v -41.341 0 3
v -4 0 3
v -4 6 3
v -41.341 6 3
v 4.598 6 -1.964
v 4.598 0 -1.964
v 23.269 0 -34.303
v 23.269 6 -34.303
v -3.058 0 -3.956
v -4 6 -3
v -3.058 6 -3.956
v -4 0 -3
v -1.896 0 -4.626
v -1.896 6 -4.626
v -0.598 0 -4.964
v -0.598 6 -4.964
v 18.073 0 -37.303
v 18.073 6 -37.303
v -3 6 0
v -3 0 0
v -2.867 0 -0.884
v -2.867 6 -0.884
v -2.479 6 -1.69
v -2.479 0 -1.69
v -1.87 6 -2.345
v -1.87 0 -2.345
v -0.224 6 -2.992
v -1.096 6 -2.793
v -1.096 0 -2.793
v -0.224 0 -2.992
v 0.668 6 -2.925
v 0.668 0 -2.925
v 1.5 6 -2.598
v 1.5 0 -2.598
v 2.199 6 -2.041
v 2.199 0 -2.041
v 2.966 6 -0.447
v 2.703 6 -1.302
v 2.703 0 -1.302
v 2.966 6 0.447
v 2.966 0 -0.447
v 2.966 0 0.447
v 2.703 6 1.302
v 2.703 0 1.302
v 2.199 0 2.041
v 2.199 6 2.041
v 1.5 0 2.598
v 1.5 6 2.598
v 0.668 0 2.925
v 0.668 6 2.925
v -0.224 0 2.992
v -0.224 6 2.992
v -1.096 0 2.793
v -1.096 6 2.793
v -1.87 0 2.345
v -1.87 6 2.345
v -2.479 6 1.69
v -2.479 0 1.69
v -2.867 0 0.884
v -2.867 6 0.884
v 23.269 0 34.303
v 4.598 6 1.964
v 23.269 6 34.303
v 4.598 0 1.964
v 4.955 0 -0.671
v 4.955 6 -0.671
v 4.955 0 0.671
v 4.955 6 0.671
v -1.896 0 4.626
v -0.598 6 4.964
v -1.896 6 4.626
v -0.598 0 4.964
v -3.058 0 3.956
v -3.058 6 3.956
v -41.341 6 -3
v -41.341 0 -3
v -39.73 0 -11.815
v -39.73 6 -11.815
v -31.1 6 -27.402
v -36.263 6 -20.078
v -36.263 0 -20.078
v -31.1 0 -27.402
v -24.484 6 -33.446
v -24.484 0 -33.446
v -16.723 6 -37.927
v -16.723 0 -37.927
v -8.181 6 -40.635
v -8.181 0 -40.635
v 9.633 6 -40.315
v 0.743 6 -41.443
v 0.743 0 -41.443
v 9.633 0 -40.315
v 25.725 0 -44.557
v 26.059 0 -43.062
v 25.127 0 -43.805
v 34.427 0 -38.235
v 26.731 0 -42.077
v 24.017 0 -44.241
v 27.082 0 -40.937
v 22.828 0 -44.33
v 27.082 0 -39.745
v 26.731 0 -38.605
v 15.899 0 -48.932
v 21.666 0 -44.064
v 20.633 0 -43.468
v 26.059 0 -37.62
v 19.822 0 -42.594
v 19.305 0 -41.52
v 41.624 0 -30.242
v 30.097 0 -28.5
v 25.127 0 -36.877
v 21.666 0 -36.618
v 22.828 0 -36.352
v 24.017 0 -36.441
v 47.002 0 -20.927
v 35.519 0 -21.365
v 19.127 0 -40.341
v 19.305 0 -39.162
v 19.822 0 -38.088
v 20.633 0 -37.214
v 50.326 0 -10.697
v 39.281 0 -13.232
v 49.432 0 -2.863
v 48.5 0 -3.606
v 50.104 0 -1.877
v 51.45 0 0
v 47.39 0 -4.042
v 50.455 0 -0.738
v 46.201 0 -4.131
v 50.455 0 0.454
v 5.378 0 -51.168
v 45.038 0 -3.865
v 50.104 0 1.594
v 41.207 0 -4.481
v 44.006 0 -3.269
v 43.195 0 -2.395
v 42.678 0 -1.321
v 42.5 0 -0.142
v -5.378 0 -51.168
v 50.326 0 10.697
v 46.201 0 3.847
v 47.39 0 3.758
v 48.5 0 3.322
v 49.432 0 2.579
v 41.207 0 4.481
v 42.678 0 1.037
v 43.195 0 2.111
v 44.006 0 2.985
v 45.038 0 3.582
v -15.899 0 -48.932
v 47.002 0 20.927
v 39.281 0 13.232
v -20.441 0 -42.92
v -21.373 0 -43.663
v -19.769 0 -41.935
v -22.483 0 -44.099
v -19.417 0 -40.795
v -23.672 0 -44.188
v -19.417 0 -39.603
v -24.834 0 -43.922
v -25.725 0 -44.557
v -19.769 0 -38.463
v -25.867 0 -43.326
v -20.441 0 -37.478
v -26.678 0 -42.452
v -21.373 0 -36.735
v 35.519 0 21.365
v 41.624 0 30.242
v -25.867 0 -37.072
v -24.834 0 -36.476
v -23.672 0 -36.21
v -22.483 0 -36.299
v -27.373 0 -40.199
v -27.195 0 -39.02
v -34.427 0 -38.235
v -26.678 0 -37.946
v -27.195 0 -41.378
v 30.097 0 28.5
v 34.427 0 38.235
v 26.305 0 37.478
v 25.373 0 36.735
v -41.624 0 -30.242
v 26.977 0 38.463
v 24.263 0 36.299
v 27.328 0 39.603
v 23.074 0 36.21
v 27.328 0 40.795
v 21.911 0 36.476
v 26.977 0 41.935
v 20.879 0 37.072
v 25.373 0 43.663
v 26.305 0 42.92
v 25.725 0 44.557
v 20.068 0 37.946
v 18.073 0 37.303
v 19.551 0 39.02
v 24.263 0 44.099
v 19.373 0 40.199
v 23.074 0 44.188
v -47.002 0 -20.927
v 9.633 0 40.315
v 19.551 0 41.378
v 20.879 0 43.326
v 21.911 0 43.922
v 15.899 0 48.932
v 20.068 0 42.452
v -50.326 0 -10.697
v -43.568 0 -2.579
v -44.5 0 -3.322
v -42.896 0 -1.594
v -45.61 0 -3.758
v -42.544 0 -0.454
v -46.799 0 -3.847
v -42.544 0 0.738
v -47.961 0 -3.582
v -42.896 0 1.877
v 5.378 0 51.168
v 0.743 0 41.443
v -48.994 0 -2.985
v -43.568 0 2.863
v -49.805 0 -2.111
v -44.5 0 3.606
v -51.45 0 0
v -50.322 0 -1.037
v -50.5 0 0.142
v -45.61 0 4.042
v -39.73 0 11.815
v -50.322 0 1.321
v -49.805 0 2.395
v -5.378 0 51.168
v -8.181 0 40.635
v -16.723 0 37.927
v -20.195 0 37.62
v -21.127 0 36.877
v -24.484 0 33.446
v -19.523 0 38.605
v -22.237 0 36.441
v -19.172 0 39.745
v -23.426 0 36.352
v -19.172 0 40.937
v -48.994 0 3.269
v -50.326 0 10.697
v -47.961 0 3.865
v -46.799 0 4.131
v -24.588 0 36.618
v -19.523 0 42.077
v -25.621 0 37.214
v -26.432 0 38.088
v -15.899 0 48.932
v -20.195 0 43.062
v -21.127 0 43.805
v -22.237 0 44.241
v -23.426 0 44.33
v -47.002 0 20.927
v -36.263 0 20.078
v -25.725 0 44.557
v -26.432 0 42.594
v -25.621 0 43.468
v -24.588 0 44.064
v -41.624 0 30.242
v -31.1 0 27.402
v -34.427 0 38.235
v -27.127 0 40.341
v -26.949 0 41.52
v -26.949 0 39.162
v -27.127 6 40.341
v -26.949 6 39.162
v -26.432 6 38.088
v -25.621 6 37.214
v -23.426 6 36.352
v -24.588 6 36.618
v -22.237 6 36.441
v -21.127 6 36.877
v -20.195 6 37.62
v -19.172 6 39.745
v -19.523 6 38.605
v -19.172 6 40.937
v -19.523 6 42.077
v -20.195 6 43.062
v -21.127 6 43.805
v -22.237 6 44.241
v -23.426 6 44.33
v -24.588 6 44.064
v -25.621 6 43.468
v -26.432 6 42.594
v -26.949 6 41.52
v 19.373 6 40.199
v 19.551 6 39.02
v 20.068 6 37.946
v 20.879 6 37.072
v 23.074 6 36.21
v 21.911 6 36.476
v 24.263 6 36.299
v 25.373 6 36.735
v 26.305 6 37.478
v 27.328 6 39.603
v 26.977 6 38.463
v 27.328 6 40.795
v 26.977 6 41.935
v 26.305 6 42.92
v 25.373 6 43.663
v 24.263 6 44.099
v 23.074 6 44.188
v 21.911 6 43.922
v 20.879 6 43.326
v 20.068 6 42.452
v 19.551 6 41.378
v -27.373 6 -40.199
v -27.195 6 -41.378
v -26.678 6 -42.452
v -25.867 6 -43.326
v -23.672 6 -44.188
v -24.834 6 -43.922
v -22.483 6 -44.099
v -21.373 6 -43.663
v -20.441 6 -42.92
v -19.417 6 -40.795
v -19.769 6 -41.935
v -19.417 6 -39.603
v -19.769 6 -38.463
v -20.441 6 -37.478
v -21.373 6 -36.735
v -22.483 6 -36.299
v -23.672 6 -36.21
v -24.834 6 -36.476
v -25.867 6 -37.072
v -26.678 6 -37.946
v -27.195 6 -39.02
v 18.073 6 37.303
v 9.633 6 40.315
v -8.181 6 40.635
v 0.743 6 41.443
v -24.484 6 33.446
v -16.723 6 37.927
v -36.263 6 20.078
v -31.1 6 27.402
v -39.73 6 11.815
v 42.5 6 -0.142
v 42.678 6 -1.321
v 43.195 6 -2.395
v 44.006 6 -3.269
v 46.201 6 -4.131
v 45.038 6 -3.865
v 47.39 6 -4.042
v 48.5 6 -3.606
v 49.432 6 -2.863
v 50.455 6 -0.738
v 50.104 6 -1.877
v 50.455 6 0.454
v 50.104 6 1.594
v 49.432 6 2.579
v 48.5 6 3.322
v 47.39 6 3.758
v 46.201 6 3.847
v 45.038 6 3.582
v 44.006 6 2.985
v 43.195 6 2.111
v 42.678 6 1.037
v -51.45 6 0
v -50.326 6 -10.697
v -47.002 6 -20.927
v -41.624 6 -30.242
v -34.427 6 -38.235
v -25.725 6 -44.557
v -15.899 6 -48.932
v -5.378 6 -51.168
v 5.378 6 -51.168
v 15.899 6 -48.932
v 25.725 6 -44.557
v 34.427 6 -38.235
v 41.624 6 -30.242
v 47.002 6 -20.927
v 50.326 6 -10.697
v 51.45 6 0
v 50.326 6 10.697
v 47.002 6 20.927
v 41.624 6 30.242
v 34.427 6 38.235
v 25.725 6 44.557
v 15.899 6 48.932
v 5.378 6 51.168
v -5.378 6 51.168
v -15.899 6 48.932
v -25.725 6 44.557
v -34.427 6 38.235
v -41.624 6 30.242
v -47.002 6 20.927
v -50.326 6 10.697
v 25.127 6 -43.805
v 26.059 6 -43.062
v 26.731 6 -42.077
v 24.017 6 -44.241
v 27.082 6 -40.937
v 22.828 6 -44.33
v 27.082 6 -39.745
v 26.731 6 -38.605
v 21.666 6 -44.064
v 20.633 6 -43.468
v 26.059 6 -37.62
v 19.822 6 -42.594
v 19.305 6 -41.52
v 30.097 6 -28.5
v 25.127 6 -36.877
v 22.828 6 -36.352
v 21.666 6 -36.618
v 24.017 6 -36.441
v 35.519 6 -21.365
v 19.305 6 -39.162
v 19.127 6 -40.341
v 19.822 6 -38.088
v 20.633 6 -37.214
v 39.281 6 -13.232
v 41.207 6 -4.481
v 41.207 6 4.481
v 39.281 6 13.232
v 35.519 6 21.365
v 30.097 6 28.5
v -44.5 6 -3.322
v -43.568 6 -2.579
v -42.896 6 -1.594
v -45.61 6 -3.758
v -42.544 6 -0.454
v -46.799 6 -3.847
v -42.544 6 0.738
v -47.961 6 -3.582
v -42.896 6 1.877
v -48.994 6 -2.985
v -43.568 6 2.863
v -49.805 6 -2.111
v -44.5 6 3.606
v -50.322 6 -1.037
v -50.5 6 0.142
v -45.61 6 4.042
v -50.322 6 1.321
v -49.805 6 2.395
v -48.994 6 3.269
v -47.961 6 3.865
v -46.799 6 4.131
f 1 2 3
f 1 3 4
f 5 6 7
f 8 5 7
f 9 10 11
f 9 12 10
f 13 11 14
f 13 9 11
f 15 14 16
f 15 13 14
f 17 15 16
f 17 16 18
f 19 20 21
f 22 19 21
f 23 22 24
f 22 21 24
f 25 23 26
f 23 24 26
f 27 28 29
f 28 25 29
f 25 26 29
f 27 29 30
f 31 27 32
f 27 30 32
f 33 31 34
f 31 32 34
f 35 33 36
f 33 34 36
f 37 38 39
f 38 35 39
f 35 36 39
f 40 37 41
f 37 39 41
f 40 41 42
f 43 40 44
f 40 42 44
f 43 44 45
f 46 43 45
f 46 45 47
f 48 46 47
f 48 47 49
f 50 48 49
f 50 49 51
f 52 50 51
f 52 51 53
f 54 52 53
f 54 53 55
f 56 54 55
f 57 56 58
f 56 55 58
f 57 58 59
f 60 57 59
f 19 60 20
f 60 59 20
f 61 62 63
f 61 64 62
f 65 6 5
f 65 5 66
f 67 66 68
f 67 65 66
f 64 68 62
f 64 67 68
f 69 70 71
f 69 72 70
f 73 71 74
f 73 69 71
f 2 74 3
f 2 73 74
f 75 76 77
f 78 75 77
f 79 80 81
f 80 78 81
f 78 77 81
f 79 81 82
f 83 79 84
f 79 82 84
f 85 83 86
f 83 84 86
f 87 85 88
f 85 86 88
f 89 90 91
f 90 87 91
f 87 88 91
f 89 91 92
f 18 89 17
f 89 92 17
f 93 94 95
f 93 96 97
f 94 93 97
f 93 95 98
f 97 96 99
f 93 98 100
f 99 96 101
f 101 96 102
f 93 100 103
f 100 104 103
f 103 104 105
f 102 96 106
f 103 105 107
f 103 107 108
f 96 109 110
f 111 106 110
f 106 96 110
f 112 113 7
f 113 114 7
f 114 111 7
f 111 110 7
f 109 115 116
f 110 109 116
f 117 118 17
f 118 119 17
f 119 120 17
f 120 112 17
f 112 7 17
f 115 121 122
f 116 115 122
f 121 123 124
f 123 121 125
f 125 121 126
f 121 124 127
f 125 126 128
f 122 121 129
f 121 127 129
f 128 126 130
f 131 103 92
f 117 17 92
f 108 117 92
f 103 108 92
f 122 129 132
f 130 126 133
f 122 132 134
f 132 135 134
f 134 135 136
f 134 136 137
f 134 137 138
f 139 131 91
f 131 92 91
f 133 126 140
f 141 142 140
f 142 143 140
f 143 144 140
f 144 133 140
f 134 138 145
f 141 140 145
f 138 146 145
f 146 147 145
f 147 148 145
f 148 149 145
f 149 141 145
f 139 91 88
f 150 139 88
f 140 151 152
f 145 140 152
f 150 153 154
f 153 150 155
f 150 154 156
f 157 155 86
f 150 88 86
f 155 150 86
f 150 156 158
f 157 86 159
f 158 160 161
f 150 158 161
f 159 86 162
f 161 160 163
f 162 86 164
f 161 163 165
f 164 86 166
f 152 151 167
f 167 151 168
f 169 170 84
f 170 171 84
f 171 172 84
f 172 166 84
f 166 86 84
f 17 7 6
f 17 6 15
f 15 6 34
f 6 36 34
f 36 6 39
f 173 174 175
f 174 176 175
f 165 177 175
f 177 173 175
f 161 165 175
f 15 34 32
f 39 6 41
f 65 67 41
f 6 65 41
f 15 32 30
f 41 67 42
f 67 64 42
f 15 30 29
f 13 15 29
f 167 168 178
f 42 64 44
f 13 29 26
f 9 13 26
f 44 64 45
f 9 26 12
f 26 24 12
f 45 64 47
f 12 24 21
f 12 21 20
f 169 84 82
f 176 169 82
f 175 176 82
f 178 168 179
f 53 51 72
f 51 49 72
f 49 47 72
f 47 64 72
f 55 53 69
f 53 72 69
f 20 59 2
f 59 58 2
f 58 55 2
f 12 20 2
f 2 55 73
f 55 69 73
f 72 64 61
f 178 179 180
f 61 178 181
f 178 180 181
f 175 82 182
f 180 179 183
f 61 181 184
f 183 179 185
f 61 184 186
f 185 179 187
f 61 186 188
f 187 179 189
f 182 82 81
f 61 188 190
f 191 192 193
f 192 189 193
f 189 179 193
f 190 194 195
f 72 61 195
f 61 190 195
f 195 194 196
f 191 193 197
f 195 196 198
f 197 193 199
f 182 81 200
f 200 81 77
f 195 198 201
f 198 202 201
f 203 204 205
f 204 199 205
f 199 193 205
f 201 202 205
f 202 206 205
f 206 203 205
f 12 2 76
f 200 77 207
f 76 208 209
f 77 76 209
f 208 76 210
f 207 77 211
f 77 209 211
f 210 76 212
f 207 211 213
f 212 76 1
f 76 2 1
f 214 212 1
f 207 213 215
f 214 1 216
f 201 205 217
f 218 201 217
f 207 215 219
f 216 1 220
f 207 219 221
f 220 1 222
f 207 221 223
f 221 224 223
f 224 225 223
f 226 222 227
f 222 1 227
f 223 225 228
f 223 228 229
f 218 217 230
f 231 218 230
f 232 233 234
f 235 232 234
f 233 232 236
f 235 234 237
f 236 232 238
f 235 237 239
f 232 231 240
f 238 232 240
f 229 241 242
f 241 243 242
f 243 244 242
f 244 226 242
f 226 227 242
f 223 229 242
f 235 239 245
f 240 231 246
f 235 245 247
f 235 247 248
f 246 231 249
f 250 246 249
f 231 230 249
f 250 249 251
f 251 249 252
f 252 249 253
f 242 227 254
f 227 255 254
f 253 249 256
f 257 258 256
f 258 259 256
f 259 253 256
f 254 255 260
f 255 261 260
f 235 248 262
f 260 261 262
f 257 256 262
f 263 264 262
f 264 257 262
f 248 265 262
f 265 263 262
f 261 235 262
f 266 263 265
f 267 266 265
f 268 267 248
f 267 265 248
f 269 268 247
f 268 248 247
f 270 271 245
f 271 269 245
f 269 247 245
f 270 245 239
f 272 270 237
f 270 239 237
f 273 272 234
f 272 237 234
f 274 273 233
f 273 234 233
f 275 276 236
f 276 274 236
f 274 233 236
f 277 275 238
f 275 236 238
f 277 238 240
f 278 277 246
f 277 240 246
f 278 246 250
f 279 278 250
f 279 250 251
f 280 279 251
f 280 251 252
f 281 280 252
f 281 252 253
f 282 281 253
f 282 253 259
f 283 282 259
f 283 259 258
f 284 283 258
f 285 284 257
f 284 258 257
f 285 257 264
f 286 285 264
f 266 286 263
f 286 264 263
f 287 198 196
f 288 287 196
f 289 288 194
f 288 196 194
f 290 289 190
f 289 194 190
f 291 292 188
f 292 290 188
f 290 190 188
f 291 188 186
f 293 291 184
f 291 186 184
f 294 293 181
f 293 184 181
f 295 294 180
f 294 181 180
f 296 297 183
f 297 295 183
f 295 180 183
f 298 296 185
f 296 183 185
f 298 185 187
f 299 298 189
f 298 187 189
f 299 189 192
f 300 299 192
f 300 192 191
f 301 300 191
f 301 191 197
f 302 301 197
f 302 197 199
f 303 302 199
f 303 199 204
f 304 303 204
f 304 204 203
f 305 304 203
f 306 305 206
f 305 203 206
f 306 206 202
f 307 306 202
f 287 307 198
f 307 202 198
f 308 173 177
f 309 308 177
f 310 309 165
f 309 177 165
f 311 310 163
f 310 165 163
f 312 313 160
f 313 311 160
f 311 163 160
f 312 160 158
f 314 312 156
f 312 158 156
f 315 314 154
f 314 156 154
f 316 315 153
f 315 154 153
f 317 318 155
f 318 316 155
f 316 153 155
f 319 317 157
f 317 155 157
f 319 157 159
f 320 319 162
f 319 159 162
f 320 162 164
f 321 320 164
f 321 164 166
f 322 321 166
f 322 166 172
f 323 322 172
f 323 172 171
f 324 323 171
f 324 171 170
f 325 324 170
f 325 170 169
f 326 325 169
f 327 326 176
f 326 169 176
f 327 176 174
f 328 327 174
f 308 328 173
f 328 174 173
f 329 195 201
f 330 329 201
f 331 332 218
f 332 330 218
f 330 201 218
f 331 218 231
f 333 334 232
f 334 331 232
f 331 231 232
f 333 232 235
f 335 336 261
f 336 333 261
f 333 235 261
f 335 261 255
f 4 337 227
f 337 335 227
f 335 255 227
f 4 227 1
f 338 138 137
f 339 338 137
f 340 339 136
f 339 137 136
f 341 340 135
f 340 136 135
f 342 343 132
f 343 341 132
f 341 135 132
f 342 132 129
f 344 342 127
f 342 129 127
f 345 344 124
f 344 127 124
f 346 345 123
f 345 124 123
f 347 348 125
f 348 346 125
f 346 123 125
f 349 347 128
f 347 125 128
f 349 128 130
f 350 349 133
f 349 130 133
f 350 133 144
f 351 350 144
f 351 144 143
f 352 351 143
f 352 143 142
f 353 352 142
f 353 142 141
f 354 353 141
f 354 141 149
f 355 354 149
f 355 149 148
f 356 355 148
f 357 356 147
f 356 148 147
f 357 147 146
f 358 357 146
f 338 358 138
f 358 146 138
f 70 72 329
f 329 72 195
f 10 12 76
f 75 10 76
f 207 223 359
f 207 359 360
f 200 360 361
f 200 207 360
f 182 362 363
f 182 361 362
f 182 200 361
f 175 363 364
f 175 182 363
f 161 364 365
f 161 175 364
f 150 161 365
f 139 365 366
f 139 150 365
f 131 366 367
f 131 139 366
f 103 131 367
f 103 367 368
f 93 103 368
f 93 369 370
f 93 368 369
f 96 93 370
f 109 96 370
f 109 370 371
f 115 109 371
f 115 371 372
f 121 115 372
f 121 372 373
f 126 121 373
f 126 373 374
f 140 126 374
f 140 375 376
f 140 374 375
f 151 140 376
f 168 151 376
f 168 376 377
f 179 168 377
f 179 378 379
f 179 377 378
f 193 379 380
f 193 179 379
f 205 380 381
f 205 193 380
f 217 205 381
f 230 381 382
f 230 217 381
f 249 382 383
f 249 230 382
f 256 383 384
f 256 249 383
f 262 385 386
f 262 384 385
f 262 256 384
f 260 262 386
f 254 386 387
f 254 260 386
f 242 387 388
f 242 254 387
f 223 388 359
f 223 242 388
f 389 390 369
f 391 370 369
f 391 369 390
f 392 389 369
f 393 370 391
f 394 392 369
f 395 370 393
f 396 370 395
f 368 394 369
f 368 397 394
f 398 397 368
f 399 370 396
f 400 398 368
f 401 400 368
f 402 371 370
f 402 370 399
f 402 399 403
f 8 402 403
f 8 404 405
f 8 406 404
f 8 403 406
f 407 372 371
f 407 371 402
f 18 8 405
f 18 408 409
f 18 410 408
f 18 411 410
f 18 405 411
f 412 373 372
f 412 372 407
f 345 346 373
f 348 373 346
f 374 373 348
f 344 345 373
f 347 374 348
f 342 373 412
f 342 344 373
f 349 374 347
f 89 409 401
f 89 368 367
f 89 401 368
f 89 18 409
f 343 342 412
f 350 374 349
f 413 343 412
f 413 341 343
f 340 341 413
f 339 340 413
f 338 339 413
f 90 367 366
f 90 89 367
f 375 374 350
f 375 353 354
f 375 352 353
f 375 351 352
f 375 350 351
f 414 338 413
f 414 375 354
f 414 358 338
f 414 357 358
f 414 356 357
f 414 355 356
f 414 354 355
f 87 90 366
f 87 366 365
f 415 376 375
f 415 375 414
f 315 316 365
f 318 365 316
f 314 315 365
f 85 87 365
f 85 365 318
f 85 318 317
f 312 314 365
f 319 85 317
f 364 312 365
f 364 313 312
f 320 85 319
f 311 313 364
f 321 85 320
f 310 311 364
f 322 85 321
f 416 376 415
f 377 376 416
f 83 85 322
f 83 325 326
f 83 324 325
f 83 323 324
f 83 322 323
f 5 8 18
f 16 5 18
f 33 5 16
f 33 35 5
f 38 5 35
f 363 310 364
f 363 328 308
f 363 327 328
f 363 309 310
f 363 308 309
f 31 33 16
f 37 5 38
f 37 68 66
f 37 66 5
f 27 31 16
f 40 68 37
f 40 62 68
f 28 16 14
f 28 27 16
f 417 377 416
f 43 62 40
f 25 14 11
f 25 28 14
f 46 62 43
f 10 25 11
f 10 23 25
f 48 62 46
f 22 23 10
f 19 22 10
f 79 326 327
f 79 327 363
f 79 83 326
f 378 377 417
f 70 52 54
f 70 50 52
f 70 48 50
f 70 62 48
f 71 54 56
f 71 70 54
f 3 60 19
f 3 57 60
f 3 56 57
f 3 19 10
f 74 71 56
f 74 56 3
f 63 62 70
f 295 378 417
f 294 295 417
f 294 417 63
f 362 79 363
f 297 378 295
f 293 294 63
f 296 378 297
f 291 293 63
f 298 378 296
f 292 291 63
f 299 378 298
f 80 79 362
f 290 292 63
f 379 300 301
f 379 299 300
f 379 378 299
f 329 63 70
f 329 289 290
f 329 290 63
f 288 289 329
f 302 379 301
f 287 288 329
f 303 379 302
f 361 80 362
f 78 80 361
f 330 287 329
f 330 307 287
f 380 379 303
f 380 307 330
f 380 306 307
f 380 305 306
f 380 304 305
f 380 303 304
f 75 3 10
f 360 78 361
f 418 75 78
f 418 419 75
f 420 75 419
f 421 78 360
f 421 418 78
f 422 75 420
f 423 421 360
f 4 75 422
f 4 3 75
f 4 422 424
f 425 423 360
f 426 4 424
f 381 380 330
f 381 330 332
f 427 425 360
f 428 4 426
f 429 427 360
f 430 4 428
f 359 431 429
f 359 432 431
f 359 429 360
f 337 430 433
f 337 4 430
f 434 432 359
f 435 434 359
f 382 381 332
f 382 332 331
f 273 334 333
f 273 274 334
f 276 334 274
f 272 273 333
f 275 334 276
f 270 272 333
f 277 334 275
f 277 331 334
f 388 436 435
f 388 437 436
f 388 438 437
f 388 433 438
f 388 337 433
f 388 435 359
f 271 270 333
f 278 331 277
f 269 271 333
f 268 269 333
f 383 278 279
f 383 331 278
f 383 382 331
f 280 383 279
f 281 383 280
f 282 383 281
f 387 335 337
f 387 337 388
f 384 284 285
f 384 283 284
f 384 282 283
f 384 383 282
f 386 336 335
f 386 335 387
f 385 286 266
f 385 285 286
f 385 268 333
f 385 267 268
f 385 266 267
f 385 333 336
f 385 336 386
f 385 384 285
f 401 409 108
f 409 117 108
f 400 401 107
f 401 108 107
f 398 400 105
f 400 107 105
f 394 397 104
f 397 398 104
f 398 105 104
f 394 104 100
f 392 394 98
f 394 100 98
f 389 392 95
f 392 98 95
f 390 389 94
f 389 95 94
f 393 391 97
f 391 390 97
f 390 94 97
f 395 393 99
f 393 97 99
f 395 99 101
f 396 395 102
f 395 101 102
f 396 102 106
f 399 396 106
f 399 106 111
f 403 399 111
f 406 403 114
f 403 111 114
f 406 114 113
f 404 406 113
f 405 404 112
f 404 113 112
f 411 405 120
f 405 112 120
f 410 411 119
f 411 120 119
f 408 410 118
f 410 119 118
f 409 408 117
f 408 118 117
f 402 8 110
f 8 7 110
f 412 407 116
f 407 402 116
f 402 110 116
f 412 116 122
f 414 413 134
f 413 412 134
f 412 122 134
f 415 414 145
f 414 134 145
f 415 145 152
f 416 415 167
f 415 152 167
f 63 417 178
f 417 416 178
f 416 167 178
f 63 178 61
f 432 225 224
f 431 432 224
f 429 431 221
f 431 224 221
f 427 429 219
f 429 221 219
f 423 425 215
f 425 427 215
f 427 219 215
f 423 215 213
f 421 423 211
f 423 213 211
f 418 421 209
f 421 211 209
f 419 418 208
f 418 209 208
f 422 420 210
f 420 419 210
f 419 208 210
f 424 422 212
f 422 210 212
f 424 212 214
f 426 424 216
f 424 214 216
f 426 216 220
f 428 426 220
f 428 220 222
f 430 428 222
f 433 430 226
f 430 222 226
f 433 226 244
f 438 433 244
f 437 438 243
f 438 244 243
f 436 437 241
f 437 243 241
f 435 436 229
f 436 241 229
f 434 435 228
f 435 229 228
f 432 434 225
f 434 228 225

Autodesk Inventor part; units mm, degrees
ref_plane "YZ Plane" through (0, 0, 0) normal (1, 0, 0) x (0, 1, 0)
ref_plane "XZ Plane" through (0, 0, 0) normal (0, 1, 0) x (-1, 0, 0)
ref_plane "XY Plane" through (0, 0, 0) normal (0, 0, 1) x (1, 0, 0)
sketch "Sketch1" plane through (0, 0, 0) normal (0, 1, 0) x (-1, 0, 0)
  circle A0 centre (0, 0) radius 51.45
  circle A1 centre (0, 0) radius 3
  line L0 (4, -3) -> (43.45, -3)
  line L1 (0.5981, 4.9641) -> (-19.1269, 39.1288)
  line L2 (-4.5981, -1.9641) -> (-24.3231, -36.1288)
  line L3 (4, 3) -> (43.45, 3)
  line L4 (-4.5981, 1.9641) -> (-24.3231, 36.1288)
  line L5 (0.5981, -4.9641) -> (-19.1269, -39.1288)
  arc A2 (4, 3) -> (0.5981, 4.9641) centre (0, 0) ccw
  arc A3 (-4.5981, 1.9641) -> (-4.5981, -1.9641) centre (0, 0) ccw
  arc A4 (0.5981, -4.9641) -> (4, -3) centre (0, 0) ccw
  arc A5 (-23.2687, 34.3026) -> (-23.2687, -34.3026) centre (0, 0) ccw
  arc A6 (-18.0726, -37.3026) -> (41.3413, -3) centre (0, 0) ccw
  arc A7 (41.3413, 3) -> (-18.0726, 37.3026) centre (0, 0) ccw
  circle A8 centre (-23.127, -40.341) radius 4
  circle A9 centre (23.3728, -40.199) radius 4
  circle A10 centre (46.4998, 0.1419) radius 4
  circle A11 centre (23.127, 40.341) radius 4
  circle A12 centre (-23.3728, 40.199) radius 4
  circle A13 centre (-46.4998, -0.1419) radius 4
  dimension "d0" = 102.9
  dimension "d2" = 6
  dimension "d7" = 360
  dimension "d9" = 6
  dimension "d12" = 360
  dimension "d16" = 8
  dimension "d17" = 46.5
  dimension "d20" = 360
extrude "Extrusion2" add sketch "Sketch1" along normal blind 6
properties part number "reaction wheel" material "PC/ABS Plastic"
